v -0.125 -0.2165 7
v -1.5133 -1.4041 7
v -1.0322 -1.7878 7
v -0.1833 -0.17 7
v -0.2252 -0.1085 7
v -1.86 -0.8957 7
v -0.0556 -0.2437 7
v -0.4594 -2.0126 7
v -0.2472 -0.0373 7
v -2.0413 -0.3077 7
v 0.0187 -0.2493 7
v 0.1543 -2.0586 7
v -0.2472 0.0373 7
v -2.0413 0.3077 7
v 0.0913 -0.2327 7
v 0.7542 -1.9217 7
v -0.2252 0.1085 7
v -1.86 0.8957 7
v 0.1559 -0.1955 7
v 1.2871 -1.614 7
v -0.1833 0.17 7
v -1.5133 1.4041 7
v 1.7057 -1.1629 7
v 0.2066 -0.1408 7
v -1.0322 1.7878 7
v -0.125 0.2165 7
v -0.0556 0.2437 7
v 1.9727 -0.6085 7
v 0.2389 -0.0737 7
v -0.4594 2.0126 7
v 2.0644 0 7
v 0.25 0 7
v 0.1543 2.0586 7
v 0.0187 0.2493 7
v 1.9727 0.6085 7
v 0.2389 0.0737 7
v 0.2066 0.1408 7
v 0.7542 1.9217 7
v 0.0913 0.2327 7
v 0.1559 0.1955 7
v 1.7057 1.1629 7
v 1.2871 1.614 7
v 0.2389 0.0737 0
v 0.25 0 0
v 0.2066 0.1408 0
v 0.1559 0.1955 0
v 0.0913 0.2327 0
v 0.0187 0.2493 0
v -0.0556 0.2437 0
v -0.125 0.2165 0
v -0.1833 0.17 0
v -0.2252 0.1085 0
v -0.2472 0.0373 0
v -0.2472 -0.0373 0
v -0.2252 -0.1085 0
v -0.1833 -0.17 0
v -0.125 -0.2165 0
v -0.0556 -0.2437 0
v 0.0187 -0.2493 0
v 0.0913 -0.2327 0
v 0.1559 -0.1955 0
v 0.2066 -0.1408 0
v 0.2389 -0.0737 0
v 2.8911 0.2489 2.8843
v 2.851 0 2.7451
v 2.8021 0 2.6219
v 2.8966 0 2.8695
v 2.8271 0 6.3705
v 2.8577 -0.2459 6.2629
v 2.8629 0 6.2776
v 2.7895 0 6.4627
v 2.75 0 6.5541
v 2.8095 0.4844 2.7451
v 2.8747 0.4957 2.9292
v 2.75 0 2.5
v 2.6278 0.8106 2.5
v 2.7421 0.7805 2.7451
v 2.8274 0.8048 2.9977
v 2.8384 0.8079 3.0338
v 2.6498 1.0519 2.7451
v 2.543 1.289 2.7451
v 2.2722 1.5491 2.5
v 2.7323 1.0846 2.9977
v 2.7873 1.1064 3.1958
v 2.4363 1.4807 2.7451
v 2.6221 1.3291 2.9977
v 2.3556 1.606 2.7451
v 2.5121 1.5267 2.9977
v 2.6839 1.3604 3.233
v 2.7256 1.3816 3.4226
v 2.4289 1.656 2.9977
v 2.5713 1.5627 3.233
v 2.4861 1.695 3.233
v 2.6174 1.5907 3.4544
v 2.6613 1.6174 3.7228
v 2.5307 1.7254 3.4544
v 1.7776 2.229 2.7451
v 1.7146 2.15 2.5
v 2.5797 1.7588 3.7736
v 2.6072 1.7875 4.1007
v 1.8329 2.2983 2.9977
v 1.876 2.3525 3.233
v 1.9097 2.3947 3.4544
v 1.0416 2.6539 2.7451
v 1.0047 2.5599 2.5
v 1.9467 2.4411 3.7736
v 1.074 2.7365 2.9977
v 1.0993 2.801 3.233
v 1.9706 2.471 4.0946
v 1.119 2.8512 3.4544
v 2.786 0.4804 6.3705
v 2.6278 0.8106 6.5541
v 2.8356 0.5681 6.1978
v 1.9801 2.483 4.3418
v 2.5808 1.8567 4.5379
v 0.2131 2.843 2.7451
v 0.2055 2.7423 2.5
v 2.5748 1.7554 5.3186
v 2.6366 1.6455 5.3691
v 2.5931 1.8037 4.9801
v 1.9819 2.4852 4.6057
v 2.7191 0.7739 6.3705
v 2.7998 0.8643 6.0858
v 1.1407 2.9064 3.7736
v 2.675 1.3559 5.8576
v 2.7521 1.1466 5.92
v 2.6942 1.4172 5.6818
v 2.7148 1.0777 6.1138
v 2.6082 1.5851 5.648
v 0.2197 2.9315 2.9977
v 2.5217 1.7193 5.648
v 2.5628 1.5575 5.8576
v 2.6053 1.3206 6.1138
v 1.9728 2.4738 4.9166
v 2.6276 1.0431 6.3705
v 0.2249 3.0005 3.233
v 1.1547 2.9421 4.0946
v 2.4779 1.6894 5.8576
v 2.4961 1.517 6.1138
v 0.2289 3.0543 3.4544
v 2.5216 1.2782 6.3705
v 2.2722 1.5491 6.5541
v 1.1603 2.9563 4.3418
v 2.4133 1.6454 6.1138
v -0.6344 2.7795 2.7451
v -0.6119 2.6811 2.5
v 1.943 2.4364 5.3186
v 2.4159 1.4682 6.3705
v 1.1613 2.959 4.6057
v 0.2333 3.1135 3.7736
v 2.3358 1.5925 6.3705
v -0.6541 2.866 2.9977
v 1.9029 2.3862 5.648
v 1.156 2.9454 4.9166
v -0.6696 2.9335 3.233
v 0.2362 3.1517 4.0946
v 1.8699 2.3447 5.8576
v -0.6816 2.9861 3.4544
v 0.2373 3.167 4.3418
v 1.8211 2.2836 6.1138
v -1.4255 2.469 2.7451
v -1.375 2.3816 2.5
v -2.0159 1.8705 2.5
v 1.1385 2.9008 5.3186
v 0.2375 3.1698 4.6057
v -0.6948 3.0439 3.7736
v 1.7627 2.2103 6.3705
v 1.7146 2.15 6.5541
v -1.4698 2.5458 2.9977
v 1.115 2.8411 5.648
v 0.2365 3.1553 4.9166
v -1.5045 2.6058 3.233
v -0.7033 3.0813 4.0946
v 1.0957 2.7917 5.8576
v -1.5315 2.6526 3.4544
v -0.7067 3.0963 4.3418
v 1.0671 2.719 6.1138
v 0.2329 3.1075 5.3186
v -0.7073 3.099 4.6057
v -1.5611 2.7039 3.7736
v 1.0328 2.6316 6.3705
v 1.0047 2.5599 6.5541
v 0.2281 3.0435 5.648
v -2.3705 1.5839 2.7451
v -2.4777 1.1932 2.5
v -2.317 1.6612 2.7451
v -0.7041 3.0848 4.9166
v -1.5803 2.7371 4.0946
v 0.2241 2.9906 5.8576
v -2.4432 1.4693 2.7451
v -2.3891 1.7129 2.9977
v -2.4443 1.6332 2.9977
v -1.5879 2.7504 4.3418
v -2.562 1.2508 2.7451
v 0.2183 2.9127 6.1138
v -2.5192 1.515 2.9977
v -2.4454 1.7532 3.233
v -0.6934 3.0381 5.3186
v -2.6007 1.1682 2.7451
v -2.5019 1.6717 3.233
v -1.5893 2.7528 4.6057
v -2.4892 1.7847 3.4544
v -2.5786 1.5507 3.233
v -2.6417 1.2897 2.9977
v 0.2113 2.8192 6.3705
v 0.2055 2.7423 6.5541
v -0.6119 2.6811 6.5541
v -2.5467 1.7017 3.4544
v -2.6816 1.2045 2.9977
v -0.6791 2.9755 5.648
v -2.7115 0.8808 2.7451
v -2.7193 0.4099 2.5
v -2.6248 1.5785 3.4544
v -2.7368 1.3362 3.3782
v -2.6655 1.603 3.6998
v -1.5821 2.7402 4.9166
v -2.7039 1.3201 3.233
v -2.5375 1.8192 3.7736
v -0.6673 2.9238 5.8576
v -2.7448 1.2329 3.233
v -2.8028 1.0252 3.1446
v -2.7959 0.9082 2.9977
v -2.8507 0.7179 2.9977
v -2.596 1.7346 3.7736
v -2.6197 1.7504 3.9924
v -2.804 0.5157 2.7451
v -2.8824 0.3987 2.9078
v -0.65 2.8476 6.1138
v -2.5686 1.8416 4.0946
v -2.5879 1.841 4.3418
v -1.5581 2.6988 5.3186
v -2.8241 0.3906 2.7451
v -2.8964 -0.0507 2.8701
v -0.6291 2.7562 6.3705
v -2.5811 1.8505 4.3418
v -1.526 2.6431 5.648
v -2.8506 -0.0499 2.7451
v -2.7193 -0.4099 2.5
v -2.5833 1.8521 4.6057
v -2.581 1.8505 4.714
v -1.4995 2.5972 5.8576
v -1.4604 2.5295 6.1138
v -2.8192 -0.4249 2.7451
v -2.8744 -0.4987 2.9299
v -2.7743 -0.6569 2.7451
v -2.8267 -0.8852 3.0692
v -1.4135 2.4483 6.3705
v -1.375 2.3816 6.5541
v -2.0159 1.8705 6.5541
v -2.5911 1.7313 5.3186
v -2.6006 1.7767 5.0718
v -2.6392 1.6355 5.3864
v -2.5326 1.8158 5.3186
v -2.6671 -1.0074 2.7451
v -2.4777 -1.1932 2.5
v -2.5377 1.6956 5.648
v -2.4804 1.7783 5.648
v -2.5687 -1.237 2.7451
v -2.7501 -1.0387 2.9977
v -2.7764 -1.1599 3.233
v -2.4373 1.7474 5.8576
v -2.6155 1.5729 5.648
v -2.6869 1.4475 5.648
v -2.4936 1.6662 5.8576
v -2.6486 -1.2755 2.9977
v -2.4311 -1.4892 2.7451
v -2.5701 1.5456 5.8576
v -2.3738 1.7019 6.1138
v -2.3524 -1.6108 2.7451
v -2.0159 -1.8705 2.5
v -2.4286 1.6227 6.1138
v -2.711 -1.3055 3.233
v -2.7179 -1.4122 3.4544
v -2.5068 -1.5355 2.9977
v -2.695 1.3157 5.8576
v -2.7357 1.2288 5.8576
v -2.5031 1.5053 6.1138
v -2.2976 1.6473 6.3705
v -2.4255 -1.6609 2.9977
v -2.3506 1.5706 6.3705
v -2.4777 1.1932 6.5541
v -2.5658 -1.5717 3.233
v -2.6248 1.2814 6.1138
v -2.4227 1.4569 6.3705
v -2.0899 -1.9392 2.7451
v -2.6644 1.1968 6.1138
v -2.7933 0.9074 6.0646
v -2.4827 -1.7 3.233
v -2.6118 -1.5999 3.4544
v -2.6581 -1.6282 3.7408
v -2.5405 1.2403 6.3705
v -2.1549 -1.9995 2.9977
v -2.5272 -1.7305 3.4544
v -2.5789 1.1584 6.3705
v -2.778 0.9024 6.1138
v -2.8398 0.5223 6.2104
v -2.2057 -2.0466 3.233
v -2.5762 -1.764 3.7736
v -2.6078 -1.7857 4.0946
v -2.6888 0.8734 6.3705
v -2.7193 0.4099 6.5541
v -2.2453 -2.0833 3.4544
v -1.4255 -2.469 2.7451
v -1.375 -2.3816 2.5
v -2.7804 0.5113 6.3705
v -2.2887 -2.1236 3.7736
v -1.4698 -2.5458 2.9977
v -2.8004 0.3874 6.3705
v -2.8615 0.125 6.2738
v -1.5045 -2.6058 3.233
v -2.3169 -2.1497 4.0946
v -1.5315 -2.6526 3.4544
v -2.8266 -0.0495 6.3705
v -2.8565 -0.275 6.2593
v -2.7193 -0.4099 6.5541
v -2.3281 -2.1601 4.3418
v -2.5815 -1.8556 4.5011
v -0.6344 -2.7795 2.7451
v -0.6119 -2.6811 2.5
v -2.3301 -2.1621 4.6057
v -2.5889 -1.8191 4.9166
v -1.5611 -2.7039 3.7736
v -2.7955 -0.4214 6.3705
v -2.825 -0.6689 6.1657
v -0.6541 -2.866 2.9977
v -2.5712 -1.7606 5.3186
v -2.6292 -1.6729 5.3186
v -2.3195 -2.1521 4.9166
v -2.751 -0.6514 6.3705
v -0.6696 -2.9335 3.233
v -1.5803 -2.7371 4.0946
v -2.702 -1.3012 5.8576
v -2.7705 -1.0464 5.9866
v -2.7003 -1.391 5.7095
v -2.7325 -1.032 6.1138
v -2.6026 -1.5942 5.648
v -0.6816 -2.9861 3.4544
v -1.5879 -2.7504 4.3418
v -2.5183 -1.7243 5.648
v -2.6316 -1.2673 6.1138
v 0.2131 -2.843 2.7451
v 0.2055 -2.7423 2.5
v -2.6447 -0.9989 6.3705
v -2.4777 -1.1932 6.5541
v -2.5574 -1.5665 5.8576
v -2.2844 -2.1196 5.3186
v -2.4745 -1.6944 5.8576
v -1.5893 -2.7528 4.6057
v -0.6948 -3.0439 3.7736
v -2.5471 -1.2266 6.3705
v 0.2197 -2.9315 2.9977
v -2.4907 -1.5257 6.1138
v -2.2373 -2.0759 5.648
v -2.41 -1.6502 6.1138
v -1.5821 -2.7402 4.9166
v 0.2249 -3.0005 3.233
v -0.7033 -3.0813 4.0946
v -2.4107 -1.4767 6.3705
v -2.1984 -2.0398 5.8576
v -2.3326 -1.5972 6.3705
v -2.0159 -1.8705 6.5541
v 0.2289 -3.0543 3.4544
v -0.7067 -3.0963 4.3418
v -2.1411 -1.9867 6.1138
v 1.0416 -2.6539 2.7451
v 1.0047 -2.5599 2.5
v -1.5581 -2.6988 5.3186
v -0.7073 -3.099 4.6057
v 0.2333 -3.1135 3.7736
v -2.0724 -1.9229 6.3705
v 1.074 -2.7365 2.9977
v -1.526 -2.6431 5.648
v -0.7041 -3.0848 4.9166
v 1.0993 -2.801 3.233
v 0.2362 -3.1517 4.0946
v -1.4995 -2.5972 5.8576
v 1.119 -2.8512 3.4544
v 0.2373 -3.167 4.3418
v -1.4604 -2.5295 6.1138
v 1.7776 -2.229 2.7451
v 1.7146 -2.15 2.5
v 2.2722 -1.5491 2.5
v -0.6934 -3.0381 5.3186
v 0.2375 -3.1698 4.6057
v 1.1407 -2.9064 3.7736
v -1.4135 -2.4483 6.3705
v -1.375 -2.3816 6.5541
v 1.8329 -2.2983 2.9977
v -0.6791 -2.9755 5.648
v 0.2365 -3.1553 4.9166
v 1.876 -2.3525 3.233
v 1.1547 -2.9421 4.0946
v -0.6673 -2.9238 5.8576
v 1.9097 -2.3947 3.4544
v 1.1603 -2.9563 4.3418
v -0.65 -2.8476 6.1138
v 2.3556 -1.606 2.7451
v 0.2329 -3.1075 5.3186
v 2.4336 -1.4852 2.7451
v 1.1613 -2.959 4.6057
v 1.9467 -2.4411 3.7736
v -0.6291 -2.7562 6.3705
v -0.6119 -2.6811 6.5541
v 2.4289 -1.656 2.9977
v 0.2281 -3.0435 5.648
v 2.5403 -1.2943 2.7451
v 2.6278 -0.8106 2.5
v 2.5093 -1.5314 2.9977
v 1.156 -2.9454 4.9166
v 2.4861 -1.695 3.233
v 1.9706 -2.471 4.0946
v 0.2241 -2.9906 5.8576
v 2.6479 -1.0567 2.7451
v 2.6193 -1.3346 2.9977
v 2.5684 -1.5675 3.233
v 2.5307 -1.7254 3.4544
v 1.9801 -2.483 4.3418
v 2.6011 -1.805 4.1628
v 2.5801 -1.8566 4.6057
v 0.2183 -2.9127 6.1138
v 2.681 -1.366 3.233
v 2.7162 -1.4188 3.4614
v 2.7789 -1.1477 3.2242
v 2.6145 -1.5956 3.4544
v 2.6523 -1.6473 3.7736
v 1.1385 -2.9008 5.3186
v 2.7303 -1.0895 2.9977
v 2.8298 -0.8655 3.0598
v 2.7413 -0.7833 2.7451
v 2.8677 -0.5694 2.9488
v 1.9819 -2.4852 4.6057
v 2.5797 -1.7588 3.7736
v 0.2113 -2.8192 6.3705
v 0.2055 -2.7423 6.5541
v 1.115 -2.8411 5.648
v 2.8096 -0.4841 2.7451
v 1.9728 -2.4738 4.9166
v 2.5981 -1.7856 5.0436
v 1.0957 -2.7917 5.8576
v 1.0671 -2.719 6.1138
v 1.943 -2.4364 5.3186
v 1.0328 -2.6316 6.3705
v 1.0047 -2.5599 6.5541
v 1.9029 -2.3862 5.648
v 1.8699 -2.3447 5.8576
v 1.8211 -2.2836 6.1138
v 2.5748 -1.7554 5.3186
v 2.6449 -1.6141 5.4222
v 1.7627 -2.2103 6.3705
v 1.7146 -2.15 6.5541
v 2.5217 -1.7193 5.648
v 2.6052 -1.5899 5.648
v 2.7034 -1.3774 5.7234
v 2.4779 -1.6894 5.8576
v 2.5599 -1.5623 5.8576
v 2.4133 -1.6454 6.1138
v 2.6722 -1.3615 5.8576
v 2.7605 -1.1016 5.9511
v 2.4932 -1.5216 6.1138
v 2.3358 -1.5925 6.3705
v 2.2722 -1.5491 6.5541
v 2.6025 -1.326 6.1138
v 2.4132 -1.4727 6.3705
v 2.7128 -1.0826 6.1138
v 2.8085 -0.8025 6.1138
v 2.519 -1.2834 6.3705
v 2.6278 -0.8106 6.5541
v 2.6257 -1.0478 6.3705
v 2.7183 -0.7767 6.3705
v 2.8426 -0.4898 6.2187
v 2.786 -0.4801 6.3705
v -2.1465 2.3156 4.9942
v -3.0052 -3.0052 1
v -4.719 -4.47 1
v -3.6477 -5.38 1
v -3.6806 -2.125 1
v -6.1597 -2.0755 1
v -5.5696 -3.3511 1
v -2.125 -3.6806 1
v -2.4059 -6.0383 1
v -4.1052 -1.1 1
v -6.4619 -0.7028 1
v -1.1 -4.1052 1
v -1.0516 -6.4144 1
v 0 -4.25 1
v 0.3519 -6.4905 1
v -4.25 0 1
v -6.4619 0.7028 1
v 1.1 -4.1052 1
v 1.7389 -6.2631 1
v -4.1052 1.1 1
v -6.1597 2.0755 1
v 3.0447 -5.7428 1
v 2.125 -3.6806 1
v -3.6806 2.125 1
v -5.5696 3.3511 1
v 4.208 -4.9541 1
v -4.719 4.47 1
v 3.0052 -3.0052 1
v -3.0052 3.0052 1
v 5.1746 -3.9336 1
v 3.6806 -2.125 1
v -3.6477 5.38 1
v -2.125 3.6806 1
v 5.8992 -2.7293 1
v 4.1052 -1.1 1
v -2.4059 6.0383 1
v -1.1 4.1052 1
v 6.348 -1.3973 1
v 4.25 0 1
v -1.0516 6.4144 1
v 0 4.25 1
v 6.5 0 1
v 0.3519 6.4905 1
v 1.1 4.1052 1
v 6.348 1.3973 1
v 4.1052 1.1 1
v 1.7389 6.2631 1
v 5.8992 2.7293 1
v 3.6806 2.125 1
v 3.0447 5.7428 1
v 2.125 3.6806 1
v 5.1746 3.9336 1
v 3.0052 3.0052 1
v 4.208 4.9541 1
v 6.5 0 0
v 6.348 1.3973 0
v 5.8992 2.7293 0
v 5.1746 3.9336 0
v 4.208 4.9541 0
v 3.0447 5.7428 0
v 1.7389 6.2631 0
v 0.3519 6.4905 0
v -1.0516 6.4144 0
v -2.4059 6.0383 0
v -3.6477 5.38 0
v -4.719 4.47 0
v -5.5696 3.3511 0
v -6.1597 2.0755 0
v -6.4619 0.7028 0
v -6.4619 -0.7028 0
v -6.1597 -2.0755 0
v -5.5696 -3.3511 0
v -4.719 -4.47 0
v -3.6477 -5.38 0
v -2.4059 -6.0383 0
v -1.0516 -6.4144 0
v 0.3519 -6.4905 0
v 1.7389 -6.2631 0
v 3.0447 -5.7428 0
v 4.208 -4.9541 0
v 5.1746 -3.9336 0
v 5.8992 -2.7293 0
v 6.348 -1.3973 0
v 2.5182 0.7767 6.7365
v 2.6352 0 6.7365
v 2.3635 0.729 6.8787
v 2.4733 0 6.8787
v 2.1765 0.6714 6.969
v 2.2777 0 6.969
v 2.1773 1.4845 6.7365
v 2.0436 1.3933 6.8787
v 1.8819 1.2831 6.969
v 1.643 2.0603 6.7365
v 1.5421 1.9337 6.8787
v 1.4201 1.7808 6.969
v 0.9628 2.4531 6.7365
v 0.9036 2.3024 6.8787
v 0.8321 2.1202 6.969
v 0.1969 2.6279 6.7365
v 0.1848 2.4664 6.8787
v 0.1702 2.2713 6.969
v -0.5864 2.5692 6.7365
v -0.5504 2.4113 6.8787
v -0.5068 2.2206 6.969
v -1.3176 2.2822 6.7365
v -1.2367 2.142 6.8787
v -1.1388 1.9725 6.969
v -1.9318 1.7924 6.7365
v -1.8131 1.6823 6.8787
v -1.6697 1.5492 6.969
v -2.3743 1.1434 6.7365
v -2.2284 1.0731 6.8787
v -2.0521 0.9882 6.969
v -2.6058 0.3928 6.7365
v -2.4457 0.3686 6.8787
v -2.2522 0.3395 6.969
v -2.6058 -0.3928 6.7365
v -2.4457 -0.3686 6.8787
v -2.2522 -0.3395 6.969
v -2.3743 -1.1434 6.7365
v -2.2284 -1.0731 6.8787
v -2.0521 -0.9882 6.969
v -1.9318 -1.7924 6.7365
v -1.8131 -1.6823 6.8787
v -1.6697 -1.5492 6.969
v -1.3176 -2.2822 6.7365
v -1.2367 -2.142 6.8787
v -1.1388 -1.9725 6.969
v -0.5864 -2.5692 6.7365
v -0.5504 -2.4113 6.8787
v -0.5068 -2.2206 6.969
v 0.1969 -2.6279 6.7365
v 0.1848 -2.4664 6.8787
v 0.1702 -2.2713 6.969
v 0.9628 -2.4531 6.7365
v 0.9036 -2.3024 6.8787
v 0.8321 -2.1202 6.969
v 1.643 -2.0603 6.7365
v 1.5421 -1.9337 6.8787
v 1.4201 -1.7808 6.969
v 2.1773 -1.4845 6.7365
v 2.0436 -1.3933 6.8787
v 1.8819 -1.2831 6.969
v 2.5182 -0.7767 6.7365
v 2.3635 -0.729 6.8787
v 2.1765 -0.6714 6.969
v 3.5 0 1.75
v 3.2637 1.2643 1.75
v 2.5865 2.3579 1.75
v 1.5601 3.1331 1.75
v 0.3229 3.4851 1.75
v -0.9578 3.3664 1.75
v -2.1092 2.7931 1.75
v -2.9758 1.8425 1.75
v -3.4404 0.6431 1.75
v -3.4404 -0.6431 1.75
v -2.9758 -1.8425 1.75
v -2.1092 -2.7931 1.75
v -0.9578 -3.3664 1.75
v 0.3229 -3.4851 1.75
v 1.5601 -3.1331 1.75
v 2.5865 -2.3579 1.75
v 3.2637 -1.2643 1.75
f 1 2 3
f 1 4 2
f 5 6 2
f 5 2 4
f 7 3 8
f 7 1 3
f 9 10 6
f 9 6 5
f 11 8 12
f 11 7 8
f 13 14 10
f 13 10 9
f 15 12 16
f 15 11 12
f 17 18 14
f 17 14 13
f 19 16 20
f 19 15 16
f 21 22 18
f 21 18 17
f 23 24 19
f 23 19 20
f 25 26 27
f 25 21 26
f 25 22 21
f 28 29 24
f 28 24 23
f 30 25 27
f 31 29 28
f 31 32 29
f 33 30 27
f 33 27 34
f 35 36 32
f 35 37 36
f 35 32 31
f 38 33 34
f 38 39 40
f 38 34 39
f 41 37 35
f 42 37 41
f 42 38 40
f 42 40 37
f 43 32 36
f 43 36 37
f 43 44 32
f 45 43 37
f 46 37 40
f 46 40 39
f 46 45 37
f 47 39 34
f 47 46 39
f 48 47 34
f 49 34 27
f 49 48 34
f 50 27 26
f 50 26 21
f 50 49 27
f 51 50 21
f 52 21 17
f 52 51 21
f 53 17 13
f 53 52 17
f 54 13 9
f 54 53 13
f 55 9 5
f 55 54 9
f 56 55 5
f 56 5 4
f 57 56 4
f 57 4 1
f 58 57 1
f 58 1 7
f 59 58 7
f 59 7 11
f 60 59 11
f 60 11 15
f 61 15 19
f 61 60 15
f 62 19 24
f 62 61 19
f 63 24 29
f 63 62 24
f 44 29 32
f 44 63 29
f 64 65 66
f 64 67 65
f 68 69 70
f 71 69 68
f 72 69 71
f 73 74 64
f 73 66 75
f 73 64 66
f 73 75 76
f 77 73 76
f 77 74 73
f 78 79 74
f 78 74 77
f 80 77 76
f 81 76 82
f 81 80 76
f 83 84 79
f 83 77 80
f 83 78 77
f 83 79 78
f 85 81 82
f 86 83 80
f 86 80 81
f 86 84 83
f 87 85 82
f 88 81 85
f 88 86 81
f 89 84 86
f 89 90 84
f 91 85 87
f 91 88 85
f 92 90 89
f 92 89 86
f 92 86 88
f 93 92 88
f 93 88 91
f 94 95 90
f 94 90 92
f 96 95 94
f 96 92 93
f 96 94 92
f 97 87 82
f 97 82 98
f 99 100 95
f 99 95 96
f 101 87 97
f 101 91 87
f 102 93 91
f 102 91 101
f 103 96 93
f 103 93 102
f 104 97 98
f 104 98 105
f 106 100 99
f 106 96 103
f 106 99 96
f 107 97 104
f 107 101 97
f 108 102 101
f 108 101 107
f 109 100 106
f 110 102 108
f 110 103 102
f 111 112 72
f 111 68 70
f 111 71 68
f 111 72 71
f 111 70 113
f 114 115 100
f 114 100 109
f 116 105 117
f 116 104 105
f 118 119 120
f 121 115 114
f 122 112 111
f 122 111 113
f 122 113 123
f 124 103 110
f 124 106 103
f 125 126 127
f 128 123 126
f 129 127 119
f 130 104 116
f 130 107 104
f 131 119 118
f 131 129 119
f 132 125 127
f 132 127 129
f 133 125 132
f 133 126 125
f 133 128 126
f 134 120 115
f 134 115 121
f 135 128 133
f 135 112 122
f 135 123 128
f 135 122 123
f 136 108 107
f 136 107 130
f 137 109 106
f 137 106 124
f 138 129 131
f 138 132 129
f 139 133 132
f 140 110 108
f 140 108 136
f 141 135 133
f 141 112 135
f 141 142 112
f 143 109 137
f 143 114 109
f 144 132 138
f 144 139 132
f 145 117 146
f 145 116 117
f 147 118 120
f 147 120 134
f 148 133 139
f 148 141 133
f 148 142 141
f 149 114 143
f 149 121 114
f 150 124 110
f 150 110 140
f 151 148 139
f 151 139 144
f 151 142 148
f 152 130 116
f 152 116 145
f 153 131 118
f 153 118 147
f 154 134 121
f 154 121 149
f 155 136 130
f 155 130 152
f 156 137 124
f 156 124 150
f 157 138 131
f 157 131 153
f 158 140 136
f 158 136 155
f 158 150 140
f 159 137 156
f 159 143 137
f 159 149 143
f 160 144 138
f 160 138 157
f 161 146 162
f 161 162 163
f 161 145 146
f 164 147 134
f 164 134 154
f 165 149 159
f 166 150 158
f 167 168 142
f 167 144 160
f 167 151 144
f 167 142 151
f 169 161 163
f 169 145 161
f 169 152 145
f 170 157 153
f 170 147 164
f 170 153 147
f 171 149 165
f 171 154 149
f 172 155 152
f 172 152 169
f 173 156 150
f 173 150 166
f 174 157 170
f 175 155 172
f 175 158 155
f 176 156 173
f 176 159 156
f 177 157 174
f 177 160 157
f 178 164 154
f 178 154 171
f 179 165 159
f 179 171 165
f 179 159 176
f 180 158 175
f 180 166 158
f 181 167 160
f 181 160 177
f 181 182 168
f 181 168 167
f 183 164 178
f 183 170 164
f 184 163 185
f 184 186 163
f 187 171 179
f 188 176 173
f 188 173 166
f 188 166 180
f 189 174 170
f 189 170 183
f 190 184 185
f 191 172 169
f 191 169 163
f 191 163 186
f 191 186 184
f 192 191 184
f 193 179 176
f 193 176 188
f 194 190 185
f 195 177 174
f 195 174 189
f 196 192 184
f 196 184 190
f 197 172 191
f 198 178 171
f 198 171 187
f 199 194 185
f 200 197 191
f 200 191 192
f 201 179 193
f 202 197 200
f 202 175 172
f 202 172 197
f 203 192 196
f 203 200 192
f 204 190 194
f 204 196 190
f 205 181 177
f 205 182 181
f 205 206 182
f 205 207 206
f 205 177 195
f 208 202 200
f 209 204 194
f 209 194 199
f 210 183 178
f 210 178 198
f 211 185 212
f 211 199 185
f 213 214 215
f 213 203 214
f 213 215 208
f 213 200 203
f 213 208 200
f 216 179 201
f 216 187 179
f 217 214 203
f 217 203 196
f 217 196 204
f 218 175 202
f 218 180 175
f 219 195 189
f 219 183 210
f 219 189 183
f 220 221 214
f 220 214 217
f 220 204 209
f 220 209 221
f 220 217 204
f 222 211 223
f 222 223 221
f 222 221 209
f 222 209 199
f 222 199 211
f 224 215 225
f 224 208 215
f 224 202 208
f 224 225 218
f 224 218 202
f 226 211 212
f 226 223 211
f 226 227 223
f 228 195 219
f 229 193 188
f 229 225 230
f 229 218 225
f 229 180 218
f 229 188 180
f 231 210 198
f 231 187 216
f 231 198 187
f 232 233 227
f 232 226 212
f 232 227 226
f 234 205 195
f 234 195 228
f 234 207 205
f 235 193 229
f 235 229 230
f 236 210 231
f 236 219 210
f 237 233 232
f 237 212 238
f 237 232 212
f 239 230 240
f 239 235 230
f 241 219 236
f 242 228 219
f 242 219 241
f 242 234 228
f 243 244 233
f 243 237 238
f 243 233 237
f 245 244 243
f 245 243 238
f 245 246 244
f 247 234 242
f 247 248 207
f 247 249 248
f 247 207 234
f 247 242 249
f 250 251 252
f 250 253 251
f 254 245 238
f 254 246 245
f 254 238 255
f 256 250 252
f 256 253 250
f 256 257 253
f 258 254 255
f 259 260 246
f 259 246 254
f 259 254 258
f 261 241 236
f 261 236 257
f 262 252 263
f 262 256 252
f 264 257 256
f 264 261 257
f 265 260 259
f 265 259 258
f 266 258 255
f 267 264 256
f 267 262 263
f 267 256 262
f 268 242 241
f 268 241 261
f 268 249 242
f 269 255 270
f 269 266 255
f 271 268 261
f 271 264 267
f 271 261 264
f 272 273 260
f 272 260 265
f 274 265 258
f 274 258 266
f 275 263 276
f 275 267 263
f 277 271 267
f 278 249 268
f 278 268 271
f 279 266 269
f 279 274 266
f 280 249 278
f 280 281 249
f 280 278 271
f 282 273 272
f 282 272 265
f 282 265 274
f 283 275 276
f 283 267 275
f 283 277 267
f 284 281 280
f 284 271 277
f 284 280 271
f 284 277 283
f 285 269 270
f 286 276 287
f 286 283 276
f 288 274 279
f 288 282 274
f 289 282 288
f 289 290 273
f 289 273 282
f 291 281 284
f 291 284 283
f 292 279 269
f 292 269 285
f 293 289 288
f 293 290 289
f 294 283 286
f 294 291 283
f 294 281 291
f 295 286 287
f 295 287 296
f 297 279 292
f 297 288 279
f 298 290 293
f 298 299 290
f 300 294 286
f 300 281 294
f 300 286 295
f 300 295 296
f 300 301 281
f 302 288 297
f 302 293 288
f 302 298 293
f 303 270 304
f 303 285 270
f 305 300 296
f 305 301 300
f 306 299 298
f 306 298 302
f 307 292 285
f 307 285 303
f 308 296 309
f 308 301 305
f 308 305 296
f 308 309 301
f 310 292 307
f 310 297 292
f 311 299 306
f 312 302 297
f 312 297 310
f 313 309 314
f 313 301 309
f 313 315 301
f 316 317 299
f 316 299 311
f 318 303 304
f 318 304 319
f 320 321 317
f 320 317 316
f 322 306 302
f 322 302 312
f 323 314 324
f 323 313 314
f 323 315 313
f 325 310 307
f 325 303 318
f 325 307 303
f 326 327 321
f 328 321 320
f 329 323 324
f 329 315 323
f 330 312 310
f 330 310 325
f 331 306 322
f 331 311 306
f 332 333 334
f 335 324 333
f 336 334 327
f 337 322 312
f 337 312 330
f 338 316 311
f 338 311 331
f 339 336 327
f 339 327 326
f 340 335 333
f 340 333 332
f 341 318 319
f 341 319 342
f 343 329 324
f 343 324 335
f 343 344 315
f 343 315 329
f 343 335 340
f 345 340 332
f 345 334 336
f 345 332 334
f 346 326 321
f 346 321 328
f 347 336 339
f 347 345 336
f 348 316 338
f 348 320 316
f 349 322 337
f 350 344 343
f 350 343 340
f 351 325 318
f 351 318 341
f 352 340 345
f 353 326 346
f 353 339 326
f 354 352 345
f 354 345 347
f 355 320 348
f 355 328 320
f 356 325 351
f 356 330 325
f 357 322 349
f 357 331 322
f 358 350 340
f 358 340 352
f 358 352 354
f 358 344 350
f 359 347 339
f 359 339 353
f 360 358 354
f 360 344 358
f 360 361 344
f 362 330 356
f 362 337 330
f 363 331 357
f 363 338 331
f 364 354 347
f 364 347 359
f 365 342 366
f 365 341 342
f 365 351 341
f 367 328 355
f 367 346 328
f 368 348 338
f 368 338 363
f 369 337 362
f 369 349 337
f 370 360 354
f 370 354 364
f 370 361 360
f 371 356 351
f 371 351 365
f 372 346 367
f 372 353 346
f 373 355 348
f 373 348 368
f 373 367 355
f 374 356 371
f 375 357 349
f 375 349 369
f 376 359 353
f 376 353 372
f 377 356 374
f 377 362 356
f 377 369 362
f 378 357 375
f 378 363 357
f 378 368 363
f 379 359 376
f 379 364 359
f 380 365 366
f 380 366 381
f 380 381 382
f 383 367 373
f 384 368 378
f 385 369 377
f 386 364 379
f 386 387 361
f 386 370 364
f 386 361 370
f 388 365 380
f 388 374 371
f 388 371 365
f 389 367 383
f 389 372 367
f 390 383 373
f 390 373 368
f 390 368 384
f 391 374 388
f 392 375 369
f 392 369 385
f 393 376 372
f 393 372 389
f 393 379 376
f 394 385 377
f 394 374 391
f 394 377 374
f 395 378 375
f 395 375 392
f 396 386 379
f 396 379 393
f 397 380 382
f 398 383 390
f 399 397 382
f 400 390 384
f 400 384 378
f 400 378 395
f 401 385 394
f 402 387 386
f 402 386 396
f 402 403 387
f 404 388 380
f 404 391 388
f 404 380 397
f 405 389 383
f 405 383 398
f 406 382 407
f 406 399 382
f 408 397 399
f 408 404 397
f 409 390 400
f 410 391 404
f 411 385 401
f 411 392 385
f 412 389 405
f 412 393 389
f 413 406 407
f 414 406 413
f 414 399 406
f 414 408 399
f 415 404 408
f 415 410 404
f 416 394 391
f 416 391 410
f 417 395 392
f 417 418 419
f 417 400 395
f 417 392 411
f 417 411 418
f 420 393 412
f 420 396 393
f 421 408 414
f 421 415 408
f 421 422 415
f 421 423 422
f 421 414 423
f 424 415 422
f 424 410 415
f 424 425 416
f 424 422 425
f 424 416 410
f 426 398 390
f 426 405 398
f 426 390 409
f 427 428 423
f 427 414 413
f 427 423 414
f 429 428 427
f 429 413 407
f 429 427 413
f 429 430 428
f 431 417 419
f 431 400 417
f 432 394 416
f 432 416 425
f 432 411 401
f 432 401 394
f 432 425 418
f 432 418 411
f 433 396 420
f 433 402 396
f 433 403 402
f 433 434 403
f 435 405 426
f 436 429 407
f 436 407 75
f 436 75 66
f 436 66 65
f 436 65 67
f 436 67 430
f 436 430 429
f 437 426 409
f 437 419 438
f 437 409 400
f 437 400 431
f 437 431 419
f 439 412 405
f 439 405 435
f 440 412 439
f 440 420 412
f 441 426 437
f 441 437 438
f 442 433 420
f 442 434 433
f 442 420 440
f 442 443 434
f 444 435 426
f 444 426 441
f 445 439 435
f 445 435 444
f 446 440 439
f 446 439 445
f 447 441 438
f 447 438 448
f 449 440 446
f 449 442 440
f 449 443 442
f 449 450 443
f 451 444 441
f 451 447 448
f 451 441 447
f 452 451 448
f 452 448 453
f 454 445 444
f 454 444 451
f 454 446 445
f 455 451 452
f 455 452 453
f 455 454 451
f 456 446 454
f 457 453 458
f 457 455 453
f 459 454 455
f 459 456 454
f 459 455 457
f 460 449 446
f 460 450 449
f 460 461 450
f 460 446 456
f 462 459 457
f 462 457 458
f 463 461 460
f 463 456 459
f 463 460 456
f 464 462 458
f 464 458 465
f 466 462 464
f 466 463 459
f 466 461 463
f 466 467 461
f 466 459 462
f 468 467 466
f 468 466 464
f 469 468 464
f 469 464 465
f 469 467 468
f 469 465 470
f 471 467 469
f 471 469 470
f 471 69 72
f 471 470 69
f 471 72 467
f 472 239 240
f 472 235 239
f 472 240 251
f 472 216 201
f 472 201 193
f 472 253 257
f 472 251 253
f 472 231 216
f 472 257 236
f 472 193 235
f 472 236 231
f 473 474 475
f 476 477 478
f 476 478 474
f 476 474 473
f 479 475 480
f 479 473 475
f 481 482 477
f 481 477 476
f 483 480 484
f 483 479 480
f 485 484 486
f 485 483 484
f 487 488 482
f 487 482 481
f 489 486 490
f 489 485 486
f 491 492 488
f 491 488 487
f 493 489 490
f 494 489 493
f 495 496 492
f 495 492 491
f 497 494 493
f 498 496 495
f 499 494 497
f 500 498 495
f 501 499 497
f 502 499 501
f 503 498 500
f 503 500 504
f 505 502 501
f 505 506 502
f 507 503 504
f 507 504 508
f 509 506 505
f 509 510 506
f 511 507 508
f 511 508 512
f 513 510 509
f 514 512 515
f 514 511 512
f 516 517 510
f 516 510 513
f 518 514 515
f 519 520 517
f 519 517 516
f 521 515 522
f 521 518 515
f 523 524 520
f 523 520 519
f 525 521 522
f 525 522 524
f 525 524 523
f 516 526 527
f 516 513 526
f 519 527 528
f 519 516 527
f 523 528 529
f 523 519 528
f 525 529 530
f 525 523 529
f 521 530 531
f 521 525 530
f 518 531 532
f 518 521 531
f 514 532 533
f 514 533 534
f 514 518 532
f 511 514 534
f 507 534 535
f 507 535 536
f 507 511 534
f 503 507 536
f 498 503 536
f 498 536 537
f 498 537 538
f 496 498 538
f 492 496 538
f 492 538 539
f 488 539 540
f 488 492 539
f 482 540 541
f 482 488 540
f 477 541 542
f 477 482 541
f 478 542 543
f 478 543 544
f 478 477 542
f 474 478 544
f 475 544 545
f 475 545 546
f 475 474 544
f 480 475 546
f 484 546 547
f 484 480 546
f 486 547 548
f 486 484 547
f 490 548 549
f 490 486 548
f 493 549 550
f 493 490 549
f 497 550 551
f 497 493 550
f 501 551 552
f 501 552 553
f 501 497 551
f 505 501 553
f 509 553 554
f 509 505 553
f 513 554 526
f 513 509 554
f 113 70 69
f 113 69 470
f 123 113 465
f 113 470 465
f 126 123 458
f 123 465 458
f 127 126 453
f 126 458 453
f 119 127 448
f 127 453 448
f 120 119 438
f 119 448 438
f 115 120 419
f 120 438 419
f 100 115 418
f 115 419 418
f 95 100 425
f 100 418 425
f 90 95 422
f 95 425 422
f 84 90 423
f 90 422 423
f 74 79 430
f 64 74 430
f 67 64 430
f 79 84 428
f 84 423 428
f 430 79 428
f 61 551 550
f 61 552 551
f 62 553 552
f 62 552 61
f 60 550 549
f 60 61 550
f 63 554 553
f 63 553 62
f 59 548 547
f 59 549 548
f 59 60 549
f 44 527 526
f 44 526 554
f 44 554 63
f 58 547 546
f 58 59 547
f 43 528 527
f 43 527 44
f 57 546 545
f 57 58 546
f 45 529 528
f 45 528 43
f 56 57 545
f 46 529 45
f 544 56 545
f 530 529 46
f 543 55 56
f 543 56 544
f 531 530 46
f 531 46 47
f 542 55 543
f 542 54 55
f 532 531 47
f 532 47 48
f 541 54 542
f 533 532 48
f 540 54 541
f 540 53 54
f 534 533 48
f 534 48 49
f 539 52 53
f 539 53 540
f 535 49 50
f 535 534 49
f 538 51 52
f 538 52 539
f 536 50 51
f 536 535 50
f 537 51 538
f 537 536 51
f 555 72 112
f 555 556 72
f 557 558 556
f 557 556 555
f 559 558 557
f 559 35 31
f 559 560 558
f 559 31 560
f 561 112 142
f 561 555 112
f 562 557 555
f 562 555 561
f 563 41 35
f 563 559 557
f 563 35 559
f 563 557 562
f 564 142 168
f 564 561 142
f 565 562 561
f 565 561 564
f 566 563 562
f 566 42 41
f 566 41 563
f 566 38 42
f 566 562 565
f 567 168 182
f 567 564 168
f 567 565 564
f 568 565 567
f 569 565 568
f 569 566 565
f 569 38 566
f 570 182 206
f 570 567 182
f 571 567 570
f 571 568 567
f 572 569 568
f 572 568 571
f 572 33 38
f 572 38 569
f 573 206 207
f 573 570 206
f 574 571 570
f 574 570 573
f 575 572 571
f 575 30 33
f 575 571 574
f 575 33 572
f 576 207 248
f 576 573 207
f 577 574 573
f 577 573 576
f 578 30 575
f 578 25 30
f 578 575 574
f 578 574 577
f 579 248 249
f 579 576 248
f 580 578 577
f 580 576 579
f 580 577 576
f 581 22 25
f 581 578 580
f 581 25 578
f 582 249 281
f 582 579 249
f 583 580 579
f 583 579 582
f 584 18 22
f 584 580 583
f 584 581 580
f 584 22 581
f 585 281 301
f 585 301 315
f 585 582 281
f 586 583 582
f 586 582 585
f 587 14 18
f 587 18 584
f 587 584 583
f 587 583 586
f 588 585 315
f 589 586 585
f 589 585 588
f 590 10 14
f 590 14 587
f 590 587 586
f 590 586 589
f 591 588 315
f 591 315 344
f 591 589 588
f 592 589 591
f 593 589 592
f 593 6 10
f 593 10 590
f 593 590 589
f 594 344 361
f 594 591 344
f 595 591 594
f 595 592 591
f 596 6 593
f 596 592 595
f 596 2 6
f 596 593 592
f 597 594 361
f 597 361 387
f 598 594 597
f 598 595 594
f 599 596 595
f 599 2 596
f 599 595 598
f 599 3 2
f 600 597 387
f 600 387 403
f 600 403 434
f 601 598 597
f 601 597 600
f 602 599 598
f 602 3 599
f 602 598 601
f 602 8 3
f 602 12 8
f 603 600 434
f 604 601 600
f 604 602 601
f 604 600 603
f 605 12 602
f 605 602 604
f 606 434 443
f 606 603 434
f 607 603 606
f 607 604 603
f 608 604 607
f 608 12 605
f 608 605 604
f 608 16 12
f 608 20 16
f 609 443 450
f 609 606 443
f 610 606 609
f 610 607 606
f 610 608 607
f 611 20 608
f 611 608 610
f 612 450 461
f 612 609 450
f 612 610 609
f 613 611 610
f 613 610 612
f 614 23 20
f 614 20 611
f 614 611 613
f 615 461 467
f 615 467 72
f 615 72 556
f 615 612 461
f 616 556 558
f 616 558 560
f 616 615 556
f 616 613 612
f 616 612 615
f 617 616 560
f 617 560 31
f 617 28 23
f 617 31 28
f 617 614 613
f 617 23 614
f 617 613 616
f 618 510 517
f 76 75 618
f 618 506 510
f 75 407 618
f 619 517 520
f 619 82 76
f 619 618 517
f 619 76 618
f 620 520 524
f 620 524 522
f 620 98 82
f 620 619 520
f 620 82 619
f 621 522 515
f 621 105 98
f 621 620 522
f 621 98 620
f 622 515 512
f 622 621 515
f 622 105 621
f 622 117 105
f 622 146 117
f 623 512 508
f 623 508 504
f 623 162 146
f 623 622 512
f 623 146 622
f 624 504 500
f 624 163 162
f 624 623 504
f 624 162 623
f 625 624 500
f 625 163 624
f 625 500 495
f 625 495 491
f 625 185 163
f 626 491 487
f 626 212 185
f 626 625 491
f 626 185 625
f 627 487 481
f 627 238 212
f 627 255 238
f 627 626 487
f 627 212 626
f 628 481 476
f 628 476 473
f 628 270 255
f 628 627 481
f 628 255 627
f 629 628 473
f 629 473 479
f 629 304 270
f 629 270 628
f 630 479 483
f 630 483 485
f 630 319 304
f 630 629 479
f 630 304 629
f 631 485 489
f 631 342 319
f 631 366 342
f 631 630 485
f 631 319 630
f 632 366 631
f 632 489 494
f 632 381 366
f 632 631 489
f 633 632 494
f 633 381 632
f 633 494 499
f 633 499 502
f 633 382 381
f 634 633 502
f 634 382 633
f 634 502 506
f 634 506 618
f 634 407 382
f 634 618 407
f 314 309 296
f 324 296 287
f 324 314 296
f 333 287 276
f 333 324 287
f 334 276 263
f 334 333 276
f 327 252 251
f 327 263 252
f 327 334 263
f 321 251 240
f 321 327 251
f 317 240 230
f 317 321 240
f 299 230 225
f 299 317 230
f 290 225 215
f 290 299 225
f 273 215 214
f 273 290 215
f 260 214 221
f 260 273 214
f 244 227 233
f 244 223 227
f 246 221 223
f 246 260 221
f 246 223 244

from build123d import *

# Parameters (mm, degrees)
F3_DEPTH      = 5
F3_DEPTH_BACK = 5


with BuildPart() as f1:
    # F0 (on Front) → F1 (revolve)
    with BuildSketch(Plane.XZ):
        with BuildLine():
            Line((0.25, 7), (0.25, 0))
            Line((0.25, 0), (6.5, 0))
            Line((6.5, 0), (6.5, 1))
            Line((6.5, 1), (4.25, 1))
            Line((4.25, 1), (2.75, 2.5))
            ThreePointArc((2.75, 2.5), (3.1793149932, 4.527027027), (2.75, 6.5540540541))
            ThreePointArc((2.75, 6.5540540541), (2.4733345666, 6.8787052332), (2.064397249, 7))
            Line((2.064397249, 7), (0.25, 7))
        make_face()
    revolve(axis=Axis((0, 0, 4.4036353938), (0, 0, 1)))


with BuildPart() as f3:
    # F2 (on Front) → F3 (new body, two sides)
    with BuildSketch(Plane.XZ) as f3_sk:
        with BuildLine():
            Line((4.25, 7.1200682409), (3.25, 7.1200682409))
            ThreePointArc((3.25, 7.1200682409), (2.5801270189, 4.6200682409), (3.25, 2.1200682409))
            Line((3.25, 2.1200682409), (4.25, 2.1200682409))
            Line((4.25, 2.1200682409), (4.25, 7.1200682409))
        make_face()
    extrude(amount=F3_DEPTH)
    extrude(f3_sk.sketch, amount=-F3_DEPTH_BACK)


with BuildPart() as f4_1:
    # F4: instance of F3
    add(f3.part.mirror(Plane.YZ))


with BuildPart() as f1_1:
    add(f1.part)

    # F5: cut F3, F4_1
    add(f3.part, mode=Mode.SUBTRACT)
    add(f4_1.part, mode=Mode.SUBTRACT)


solid = f1_1.part
